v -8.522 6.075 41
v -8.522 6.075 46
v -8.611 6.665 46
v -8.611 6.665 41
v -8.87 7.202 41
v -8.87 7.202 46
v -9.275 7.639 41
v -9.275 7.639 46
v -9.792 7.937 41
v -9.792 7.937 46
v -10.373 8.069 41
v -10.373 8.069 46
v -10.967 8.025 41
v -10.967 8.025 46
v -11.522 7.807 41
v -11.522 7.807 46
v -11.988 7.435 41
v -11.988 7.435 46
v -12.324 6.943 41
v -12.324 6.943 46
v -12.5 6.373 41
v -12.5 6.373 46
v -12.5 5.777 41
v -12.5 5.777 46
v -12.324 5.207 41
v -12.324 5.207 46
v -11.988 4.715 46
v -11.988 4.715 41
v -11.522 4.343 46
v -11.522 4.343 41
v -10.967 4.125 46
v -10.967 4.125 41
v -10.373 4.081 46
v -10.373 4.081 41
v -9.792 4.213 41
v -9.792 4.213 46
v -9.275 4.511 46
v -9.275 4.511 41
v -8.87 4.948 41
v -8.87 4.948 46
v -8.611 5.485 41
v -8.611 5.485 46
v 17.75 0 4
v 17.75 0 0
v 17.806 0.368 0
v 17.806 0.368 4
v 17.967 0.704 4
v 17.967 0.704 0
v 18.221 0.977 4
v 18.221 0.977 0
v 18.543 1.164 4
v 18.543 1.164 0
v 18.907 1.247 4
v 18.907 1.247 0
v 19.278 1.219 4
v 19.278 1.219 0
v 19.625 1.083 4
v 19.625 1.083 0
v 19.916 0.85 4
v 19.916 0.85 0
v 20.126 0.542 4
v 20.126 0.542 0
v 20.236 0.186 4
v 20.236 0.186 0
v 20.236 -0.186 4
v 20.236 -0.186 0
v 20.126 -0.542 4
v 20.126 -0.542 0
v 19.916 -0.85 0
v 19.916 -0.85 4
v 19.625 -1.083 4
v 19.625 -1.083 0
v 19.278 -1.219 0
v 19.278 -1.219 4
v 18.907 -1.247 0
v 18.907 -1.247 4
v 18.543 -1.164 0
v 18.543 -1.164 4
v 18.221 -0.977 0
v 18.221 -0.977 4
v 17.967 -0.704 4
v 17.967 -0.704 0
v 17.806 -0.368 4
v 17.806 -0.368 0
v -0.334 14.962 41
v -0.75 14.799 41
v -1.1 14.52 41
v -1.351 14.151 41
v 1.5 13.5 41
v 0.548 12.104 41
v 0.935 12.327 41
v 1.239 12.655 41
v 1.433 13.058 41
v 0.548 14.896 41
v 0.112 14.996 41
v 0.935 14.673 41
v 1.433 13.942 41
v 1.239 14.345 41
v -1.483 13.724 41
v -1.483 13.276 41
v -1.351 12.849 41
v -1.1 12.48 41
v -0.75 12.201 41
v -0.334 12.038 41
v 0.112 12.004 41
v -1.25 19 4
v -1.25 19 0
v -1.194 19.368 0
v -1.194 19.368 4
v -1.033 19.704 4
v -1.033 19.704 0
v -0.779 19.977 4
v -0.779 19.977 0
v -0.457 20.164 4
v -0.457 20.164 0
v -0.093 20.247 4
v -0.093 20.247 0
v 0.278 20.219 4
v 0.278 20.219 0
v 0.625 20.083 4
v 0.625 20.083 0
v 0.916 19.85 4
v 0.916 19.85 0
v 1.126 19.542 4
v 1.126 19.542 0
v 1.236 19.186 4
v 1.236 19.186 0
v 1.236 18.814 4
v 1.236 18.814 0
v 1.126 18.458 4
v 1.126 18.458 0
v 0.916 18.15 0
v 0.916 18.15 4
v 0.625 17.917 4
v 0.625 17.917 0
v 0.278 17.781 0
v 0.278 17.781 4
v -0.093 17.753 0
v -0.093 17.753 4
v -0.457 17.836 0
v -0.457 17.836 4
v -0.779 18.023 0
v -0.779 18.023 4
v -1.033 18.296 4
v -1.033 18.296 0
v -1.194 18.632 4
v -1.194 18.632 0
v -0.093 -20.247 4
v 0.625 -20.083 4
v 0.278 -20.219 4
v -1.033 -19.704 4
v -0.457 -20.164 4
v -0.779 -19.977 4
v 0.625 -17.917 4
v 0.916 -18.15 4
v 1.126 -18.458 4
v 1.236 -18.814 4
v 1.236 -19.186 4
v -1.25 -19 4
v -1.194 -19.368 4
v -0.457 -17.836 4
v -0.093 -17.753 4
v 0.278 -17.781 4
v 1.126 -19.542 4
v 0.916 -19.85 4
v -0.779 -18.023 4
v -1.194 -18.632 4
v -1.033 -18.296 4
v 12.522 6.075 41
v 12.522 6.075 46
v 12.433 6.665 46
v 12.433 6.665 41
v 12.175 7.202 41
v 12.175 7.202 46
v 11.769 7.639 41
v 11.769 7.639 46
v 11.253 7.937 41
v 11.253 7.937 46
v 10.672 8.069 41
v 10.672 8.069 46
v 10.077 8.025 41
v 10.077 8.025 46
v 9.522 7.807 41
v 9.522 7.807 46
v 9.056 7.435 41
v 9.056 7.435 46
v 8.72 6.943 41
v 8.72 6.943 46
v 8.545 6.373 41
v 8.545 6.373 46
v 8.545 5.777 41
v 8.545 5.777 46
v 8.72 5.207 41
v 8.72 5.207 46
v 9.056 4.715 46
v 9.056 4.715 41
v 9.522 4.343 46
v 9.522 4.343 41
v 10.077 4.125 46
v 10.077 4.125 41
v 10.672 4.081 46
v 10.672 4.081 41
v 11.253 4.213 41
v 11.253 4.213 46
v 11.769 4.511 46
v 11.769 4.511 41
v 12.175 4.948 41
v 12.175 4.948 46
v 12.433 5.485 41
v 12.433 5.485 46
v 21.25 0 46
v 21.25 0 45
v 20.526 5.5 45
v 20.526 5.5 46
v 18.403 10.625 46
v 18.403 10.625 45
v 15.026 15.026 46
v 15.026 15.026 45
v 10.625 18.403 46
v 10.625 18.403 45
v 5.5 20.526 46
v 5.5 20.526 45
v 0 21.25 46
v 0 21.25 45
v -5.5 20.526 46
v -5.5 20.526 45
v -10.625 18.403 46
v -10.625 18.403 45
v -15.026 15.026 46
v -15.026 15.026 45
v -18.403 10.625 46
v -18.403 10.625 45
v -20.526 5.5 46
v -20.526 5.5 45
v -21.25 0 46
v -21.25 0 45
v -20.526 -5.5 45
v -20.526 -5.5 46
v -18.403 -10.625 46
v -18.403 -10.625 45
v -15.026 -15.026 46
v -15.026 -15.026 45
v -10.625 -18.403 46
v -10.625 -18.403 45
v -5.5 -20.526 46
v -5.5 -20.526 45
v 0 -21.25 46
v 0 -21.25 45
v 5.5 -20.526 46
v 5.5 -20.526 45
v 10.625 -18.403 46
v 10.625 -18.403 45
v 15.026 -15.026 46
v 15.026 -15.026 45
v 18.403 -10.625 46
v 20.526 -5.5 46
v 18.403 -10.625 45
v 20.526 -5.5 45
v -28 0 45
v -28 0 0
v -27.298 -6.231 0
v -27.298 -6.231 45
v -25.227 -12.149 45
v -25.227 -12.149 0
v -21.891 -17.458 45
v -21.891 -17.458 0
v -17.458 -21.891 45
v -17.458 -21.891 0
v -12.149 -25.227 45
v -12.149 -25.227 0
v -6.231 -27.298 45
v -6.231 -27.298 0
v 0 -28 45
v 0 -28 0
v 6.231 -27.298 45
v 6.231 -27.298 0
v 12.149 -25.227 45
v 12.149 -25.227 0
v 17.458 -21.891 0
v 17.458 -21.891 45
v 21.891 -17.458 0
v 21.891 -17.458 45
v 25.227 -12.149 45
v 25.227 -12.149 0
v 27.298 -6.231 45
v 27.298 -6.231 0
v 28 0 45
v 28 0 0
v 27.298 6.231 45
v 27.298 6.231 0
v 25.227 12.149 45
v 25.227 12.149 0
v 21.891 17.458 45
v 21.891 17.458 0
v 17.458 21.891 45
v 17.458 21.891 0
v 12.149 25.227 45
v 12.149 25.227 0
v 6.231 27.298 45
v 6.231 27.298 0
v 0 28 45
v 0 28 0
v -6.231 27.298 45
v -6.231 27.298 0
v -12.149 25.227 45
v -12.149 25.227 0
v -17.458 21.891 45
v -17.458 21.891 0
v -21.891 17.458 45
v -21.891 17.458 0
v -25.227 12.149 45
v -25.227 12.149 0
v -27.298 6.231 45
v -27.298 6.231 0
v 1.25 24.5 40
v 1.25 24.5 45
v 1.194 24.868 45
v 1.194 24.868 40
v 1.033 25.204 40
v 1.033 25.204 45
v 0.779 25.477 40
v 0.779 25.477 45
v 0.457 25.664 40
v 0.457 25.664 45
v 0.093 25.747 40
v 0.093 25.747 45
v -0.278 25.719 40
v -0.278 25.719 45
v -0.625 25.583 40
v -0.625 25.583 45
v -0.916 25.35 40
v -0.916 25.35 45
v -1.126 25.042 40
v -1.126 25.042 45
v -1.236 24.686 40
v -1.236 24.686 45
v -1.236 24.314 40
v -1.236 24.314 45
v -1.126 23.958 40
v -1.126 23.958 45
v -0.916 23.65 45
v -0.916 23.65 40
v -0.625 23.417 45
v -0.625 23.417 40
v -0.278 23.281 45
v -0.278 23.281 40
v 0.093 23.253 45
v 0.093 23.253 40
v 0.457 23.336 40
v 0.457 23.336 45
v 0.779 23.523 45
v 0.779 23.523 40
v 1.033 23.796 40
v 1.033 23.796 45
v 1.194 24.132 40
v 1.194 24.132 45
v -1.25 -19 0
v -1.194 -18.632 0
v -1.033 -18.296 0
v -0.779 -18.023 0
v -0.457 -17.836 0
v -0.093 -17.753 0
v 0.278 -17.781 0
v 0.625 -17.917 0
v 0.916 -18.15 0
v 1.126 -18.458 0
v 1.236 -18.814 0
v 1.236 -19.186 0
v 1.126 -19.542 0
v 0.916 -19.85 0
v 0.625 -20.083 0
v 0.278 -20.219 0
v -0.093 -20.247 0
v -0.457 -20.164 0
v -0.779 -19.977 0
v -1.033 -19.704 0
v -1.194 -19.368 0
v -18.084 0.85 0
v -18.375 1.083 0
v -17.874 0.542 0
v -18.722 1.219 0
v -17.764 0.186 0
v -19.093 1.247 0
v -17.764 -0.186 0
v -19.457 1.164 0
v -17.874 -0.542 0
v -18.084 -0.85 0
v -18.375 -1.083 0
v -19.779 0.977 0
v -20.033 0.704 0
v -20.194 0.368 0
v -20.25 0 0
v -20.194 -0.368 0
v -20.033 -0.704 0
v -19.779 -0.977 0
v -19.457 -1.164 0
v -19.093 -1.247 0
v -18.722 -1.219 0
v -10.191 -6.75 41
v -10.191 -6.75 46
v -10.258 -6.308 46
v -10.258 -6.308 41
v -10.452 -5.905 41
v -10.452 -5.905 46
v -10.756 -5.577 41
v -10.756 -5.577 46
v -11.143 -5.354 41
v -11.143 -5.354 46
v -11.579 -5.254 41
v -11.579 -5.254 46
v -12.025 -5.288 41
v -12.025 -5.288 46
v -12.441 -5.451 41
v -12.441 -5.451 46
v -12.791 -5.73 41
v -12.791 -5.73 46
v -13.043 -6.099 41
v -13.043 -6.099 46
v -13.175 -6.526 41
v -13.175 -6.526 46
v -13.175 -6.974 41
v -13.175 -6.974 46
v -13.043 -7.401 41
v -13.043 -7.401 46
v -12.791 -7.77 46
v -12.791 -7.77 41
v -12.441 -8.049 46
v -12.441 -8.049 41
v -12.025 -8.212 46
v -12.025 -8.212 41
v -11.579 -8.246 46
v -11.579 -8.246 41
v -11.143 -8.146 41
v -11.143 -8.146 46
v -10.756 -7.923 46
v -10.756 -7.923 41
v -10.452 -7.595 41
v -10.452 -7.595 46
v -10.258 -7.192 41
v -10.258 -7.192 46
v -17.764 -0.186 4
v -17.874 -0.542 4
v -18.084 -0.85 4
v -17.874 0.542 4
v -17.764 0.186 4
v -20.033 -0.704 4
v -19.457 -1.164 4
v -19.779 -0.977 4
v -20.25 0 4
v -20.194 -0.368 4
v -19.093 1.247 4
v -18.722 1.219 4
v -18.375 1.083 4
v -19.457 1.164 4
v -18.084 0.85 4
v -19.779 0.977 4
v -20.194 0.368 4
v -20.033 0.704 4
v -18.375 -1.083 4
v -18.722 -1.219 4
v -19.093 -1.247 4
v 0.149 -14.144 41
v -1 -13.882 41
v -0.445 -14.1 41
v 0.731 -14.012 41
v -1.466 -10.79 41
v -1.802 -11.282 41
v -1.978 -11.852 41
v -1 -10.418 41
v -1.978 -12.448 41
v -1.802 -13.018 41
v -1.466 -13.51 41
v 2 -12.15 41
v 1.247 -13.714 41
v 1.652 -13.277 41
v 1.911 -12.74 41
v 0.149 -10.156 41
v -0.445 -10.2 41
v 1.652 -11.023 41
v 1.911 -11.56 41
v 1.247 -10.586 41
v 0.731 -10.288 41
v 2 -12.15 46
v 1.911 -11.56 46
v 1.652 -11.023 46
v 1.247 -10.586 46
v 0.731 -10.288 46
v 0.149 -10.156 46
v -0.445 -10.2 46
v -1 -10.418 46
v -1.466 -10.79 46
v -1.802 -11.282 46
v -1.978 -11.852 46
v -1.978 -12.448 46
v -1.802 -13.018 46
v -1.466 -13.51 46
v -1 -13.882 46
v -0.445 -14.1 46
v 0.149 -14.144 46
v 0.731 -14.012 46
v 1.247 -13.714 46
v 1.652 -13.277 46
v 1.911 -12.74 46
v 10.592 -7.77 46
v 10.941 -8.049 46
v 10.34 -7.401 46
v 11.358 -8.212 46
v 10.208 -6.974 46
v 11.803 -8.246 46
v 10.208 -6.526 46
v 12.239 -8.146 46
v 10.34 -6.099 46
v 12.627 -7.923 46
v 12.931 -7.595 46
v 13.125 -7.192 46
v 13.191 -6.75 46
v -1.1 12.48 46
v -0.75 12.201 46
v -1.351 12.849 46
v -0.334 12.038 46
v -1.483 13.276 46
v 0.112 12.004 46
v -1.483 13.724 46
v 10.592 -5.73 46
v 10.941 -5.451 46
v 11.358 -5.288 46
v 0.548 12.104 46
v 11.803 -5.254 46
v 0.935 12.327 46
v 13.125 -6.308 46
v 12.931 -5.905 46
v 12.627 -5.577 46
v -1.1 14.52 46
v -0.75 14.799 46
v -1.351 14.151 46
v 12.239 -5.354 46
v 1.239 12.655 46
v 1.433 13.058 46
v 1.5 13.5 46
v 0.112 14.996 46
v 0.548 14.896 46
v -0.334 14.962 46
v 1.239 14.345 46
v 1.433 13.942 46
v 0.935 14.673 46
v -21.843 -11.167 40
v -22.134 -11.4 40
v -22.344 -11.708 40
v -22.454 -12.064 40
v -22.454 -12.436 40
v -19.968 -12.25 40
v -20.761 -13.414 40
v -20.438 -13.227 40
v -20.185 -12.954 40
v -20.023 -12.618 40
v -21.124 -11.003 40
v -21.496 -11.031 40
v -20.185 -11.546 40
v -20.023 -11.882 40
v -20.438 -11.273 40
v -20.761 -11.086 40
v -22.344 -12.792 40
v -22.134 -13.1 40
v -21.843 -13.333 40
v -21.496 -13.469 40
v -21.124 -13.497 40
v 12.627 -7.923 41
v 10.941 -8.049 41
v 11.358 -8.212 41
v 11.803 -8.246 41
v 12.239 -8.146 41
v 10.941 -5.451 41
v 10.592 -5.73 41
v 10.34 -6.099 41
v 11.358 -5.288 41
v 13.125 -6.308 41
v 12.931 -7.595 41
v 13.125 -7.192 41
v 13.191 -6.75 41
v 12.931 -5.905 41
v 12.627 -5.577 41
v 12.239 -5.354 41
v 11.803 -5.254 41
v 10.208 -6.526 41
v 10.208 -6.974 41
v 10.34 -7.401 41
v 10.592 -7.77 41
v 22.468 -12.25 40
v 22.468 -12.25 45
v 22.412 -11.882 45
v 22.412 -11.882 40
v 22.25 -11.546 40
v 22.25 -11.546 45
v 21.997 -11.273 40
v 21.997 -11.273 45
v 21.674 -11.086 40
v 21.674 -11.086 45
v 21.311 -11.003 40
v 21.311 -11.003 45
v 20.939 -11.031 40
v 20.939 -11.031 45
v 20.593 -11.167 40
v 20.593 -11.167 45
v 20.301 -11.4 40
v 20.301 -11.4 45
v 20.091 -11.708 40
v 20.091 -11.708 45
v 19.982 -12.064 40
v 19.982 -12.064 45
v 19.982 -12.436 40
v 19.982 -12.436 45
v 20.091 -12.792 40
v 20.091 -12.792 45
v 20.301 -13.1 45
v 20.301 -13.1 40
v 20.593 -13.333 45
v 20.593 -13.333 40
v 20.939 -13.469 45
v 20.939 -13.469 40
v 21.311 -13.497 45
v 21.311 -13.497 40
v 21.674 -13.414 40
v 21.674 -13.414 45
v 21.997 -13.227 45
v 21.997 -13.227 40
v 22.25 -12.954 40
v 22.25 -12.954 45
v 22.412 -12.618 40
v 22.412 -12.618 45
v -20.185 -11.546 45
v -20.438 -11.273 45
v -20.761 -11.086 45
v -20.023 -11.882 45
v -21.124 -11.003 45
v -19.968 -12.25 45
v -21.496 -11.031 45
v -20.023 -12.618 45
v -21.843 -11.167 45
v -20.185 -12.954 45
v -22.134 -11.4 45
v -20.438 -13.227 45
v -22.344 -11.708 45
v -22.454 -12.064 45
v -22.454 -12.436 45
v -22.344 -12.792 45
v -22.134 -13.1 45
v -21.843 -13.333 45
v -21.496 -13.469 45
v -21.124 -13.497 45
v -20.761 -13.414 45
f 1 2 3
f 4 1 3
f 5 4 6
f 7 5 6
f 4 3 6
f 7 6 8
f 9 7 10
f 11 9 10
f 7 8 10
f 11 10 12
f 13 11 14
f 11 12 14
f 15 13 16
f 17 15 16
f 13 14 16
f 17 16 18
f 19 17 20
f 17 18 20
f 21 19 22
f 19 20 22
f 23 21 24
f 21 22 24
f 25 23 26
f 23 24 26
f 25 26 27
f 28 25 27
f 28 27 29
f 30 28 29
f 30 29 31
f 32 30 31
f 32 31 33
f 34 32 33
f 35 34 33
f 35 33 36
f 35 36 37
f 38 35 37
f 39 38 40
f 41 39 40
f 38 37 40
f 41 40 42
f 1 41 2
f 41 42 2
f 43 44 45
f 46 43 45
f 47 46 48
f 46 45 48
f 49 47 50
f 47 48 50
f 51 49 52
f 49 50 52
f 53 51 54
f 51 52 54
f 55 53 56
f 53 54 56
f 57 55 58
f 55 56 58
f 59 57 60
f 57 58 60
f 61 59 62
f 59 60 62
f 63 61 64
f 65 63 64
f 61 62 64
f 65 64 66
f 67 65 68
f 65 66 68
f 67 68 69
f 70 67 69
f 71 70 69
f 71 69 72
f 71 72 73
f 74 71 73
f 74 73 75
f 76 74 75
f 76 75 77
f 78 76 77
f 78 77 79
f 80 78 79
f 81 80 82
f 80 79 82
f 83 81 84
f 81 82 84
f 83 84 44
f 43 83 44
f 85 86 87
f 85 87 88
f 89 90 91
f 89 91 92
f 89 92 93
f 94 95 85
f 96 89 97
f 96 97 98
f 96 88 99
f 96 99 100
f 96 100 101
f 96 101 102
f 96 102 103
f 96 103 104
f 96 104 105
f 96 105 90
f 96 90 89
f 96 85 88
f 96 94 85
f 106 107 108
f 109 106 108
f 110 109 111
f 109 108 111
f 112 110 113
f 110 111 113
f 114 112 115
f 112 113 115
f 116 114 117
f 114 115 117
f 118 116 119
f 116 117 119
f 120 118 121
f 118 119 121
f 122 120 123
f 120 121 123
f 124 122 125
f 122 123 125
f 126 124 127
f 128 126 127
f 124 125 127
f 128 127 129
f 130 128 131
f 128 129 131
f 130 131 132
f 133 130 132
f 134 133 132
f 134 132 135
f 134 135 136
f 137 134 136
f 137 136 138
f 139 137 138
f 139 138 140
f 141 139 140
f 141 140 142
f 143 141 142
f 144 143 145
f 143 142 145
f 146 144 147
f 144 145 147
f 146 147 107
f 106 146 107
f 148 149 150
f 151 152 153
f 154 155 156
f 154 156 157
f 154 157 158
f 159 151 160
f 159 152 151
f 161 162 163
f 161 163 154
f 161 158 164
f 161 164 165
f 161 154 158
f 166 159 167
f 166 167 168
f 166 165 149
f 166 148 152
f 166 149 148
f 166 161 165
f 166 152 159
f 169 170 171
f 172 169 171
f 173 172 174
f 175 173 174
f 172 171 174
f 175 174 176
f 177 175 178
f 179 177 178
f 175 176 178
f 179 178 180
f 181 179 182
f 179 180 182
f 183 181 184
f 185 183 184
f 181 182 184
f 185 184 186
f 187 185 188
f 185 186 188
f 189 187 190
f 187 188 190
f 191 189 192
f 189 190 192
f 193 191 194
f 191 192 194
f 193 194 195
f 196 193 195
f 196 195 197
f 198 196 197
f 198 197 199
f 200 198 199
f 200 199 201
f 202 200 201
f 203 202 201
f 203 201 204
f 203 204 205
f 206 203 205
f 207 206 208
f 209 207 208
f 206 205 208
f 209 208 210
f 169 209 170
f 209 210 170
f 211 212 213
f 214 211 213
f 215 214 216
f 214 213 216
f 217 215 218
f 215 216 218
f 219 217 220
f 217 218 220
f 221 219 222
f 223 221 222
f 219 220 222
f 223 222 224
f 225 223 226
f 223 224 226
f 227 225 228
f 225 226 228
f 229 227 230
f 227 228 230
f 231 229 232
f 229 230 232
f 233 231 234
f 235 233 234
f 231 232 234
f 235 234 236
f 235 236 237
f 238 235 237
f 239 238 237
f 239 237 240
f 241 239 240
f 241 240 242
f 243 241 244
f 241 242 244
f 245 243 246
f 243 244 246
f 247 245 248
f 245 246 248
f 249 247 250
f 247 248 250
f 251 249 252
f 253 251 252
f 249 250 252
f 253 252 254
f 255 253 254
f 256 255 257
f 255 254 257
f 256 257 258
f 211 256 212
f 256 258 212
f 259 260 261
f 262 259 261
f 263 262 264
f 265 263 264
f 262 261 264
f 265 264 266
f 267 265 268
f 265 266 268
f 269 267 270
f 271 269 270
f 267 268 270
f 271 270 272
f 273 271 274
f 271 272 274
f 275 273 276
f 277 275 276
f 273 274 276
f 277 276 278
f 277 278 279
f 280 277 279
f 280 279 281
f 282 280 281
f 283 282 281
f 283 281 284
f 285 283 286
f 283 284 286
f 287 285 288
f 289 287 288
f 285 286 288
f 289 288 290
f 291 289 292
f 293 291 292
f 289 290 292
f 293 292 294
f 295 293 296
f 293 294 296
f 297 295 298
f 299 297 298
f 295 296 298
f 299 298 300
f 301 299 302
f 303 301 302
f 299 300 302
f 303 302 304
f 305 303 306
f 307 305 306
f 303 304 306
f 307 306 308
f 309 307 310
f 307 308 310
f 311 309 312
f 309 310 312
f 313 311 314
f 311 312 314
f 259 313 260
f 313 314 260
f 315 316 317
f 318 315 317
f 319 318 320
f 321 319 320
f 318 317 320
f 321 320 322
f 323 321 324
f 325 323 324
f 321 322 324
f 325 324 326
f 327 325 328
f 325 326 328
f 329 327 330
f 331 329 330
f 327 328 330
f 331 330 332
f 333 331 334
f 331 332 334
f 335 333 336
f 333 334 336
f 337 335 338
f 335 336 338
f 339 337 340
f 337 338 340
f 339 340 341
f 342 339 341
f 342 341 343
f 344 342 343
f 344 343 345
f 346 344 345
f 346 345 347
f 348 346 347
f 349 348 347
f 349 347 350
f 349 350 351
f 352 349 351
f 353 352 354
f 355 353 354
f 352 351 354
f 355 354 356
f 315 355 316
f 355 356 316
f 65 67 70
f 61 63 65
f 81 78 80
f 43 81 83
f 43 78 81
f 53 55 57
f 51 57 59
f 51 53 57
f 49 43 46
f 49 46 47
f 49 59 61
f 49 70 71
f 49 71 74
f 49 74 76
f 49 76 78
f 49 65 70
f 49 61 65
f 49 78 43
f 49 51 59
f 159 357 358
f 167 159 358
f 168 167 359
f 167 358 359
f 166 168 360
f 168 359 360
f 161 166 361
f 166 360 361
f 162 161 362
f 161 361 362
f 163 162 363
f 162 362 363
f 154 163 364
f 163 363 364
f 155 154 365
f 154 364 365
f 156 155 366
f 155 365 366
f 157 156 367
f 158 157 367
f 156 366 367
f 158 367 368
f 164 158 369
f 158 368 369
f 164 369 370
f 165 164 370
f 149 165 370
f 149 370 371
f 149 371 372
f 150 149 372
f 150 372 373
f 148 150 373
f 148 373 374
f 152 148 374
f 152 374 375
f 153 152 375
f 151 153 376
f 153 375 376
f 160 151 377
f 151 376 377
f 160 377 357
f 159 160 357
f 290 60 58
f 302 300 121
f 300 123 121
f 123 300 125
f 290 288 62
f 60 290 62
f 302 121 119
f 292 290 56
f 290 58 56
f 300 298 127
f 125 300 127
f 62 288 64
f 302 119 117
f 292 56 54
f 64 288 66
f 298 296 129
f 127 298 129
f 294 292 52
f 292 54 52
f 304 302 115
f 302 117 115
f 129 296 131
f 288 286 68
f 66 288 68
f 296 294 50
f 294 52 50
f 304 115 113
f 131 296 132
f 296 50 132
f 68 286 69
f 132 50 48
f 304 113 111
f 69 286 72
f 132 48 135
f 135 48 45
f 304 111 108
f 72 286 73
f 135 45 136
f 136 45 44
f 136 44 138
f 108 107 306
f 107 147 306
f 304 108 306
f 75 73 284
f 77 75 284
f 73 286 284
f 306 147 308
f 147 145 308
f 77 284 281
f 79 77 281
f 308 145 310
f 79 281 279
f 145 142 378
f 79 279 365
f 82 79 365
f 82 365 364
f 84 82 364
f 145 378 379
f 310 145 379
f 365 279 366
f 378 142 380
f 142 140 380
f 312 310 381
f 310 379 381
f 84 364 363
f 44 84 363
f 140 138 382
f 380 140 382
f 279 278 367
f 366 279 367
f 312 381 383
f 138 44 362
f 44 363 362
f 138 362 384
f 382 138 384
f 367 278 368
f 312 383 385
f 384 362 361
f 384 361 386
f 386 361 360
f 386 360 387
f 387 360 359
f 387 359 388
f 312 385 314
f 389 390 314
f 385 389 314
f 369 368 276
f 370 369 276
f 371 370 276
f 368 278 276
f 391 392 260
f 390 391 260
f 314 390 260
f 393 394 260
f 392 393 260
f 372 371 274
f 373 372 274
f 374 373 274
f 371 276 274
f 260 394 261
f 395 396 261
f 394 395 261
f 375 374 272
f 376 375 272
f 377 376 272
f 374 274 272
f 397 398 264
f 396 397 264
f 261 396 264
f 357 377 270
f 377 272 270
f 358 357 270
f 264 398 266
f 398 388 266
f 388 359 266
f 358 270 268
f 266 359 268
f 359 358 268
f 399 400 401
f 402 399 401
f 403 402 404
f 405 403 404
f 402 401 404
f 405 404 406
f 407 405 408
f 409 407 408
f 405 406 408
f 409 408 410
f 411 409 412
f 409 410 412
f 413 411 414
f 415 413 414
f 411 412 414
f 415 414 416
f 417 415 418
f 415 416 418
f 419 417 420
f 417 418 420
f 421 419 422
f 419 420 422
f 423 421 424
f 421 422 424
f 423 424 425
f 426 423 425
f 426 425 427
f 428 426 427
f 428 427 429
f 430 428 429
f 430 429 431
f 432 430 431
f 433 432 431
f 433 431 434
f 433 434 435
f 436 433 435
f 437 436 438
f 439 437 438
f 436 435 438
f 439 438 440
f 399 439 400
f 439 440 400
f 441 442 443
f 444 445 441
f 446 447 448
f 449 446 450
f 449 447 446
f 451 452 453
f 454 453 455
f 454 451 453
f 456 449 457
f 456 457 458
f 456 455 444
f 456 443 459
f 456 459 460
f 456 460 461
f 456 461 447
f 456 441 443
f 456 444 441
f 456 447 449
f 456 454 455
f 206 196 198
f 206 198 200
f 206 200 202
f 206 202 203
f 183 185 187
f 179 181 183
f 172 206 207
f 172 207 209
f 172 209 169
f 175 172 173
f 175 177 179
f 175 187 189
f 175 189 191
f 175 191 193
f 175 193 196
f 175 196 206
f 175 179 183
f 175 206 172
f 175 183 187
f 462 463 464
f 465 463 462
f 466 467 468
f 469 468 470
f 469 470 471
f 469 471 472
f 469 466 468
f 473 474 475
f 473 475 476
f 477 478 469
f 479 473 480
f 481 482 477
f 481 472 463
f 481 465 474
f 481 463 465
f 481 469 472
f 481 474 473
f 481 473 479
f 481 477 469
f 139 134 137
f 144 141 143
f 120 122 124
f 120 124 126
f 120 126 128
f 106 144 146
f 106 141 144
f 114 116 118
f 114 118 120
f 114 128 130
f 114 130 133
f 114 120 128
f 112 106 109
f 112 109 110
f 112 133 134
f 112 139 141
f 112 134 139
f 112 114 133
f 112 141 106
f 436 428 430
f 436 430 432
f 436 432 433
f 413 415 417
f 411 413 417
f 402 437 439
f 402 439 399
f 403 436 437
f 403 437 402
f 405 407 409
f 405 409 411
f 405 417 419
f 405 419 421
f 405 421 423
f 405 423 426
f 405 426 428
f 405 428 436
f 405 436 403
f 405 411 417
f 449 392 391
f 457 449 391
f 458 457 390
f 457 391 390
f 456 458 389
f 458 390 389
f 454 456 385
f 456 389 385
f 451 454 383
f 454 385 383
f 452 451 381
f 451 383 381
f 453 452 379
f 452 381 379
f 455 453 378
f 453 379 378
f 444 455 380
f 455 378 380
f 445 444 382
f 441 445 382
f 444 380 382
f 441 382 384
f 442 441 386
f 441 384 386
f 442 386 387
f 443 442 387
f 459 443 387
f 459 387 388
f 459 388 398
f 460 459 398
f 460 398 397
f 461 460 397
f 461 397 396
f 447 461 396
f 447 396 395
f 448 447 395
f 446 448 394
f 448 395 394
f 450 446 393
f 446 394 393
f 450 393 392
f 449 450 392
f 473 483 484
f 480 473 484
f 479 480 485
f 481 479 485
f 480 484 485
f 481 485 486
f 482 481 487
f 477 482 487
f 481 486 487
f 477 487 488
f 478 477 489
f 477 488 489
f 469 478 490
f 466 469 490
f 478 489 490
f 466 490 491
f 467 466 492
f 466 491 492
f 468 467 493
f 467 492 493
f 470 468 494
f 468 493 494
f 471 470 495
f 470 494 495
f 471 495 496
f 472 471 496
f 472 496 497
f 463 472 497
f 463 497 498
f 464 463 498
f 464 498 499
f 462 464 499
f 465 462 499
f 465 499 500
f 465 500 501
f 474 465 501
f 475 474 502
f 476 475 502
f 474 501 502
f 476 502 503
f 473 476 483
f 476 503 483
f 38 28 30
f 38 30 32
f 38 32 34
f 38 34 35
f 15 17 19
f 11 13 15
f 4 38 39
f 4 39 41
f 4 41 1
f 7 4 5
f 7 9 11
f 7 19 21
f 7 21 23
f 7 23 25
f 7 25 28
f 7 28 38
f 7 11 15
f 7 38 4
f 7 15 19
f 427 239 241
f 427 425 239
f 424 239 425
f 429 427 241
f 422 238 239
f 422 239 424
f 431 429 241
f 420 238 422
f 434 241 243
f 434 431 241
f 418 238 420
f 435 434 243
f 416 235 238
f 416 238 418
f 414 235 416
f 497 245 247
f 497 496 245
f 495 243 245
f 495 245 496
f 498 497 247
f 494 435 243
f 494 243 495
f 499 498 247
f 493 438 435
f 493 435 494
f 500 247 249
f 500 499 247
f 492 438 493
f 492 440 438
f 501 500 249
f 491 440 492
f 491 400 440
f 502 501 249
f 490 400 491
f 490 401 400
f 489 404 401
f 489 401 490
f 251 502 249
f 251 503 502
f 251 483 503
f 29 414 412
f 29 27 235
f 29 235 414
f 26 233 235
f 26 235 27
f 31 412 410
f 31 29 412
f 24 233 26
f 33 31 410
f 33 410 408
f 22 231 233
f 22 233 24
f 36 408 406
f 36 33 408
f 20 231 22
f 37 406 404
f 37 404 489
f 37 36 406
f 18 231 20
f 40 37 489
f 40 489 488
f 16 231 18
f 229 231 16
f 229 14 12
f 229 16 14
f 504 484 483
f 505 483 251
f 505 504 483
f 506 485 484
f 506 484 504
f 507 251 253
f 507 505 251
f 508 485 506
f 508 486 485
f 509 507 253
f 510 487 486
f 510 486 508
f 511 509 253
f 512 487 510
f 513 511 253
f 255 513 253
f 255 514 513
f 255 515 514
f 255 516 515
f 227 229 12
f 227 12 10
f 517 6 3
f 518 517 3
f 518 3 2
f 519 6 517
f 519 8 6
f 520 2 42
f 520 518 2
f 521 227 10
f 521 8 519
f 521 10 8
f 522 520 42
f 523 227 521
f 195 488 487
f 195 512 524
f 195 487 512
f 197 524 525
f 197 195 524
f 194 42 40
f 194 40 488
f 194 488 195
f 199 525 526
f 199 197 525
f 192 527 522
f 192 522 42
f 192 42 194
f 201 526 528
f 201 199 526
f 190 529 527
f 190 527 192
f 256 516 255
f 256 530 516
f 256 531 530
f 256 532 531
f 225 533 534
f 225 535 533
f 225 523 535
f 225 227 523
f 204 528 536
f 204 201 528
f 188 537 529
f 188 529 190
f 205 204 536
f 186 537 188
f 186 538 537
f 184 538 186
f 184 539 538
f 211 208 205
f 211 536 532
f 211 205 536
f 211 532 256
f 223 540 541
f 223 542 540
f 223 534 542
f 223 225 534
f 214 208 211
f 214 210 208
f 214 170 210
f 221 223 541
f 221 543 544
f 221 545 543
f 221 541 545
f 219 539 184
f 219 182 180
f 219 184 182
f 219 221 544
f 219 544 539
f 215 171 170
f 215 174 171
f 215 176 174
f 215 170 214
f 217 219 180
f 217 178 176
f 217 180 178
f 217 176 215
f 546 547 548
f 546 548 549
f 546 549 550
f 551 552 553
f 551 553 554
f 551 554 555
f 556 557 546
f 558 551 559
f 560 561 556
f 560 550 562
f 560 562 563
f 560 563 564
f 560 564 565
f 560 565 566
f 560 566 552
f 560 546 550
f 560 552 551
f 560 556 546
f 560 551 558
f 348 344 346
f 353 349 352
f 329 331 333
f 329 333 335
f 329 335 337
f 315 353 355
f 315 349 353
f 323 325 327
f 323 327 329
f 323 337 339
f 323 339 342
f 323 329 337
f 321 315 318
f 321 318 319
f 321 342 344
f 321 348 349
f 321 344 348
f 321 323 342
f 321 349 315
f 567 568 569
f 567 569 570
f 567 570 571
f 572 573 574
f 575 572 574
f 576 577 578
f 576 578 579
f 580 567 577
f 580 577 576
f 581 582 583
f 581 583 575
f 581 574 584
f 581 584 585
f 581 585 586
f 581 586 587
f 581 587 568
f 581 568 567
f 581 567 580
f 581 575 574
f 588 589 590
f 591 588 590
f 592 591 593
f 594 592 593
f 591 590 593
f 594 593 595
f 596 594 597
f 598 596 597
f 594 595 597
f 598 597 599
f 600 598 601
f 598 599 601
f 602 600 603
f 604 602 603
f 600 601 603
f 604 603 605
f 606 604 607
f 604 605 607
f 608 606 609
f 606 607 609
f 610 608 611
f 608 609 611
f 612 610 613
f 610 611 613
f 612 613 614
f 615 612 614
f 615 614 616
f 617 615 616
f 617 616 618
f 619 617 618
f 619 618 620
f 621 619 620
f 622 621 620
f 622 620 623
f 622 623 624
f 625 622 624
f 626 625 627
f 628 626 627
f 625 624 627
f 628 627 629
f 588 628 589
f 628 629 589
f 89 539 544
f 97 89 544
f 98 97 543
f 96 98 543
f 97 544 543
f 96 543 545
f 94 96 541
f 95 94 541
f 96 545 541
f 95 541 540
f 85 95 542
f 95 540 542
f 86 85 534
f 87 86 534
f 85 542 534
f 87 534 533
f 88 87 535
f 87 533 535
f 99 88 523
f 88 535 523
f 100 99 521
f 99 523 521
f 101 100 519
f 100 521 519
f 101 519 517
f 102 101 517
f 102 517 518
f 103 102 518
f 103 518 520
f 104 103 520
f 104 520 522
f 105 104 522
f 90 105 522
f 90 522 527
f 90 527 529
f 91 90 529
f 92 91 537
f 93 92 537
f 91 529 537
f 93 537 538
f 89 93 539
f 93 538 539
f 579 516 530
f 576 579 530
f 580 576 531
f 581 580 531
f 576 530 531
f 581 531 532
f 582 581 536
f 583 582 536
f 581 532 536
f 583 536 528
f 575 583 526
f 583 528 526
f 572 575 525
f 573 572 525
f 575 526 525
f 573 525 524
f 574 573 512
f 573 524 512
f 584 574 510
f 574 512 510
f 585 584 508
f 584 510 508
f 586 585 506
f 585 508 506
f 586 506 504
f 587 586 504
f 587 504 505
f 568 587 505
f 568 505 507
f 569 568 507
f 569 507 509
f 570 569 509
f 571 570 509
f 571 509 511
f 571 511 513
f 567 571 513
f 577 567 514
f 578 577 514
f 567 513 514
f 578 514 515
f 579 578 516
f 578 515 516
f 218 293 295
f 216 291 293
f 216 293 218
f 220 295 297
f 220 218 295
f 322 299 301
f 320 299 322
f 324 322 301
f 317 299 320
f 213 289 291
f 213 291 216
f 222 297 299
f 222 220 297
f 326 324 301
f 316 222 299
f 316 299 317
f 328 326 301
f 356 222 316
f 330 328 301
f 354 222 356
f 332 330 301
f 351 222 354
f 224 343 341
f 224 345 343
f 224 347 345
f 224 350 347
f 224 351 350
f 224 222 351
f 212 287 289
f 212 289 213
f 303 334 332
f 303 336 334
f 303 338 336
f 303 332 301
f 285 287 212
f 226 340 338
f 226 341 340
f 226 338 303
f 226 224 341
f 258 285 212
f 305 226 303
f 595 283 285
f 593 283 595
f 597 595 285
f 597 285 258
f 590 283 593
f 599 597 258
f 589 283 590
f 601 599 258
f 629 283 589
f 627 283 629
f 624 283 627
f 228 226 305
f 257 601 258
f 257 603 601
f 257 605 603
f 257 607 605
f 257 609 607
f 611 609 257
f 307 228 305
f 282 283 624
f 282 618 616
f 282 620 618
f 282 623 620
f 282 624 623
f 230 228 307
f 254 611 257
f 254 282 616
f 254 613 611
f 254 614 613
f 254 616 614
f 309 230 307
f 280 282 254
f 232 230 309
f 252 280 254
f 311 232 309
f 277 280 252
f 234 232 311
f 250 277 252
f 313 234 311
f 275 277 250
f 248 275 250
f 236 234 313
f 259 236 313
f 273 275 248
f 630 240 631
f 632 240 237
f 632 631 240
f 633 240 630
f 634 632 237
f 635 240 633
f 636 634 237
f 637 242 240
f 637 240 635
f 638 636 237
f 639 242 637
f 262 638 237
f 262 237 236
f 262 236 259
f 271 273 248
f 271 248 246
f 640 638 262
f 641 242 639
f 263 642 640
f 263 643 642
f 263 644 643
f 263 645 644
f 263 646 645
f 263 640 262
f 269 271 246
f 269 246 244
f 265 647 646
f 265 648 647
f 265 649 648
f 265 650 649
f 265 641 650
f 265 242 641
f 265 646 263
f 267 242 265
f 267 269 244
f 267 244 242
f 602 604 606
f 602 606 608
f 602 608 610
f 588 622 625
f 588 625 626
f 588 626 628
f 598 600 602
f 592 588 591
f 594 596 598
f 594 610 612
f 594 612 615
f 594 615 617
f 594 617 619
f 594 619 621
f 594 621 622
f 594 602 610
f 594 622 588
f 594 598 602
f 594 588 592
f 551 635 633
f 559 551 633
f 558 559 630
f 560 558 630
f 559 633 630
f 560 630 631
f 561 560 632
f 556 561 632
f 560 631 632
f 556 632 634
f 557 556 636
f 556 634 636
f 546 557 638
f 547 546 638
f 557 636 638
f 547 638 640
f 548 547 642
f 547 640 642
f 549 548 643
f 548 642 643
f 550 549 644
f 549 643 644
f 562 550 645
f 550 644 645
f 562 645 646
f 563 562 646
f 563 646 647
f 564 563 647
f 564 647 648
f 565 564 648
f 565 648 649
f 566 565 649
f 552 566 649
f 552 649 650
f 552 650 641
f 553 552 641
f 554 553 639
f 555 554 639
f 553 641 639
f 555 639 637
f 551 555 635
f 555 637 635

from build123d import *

# Parameters (mm, degrees)
SKETCH_1_R          = 28
EXTRUDE_1_DEPTH     = 45
SKETCH_2_R          = 1.25
CUT_EXTRUDE_1_DEPTH = 4
SKETCH_3_R          = 1.25
CUT_EXTRUDE_2_DEPTH = 5
SKETCH_4_R          = 21.25
EXTRUDE_2_DEPTH     = 1
SKETCH_5_R          = 1.5
CUT_EXTRUDE_3_DEPTH = 5
SKETCH_6_R          = 2
CUT_EXTRUDE_4_DEPTH = 5


with BuildPart() as part:
    # 草图1 → 凸台-拉伸1 (new body)
    with BuildSketch(Plane.XY):
        with Locations(Location((0, 0, 0), (0, 0, 180))):
            Circle(SKETCH_1_R)
    extrude(amount=EXTRUDE_1_DEPTH)

    # 草图2 → 切除-拉伸1 (cut)
    with BuildSketch(Plane(origin=(0, 0, 0), x_dir=(-1, 0, 0), z_dir=(0, 0, -1))):
        with Locations((19, 0)):
            Circle(SKETCH_2_R)
        with Locations((0, -19)):
            Circle(SKETCH_2_R)
        with Locations((-19, 0)):
            Circle(SKETCH_2_R)
        with Locations((0, 19)):
            Circle(SKETCH_2_R)
    extrude(amount=-CUT_EXTRUDE_1_DEPTH, mode=Mode.SUBTRACT)

    # 草图3 → 切除-拉伸2 (cut)
    with BuildSketch(Plane.XY.offset(45)):
        with Locations((0, 24.5)):
            Circle(SKETCH_3_R)
        with Locations((21.217622393, -12.25)):
            Circle(SKETCH_3_R)
        with Locations((-21.217622393, -12.25)):
            Circle(SKETCH_3_R)
    extrude(amount=-CUT_EXTRUDE_2_DEPTH, mode=Mode.SUBTRACT)

    # 草图4 → 凸台-拉伸2 (add)
    with BuildSketch(Plane.XY.offset(45)):
        Circle(SKETCH_4_R)
    extrude(amount=EXTRUDE_2_DEPTH)

    # 草图5 → 切除-拉伸3 (cut)
    with BuildSketch(Plane.XY.offset(46)):
        with Locations((0, 13.5)):
            Circle(SKETCH_5_R)
        with Locations((11.691342951, -6.75)):
            Circle(SKETCH_5_R)
        with Locations((-11.691342951, -6.75)):
            Circle(SKETCH_5_R)
    extrude(amount=-CUT_EXTRUDE_3_DEPTH, mode=Mode.SUBTRACT)

    # 草图6 → 切除-拉伸4 (cut)
    with BuildSketch(Plane.XY.offset(46)):
        with Locations((0, -12.15)):
            Circle(SKETCH_6_R)
        with Locations((-10.522208656, 6.075)):
            Circle(SKETCH_6_R)
        with Locations((10.522208656, 6.075)):
            Circle(SKETCH_6_R)
    extrude(amount=-CUT_EXTRUDE_4_DEPTH, mode=Mode.SUBTRACT)


solid = part.part
